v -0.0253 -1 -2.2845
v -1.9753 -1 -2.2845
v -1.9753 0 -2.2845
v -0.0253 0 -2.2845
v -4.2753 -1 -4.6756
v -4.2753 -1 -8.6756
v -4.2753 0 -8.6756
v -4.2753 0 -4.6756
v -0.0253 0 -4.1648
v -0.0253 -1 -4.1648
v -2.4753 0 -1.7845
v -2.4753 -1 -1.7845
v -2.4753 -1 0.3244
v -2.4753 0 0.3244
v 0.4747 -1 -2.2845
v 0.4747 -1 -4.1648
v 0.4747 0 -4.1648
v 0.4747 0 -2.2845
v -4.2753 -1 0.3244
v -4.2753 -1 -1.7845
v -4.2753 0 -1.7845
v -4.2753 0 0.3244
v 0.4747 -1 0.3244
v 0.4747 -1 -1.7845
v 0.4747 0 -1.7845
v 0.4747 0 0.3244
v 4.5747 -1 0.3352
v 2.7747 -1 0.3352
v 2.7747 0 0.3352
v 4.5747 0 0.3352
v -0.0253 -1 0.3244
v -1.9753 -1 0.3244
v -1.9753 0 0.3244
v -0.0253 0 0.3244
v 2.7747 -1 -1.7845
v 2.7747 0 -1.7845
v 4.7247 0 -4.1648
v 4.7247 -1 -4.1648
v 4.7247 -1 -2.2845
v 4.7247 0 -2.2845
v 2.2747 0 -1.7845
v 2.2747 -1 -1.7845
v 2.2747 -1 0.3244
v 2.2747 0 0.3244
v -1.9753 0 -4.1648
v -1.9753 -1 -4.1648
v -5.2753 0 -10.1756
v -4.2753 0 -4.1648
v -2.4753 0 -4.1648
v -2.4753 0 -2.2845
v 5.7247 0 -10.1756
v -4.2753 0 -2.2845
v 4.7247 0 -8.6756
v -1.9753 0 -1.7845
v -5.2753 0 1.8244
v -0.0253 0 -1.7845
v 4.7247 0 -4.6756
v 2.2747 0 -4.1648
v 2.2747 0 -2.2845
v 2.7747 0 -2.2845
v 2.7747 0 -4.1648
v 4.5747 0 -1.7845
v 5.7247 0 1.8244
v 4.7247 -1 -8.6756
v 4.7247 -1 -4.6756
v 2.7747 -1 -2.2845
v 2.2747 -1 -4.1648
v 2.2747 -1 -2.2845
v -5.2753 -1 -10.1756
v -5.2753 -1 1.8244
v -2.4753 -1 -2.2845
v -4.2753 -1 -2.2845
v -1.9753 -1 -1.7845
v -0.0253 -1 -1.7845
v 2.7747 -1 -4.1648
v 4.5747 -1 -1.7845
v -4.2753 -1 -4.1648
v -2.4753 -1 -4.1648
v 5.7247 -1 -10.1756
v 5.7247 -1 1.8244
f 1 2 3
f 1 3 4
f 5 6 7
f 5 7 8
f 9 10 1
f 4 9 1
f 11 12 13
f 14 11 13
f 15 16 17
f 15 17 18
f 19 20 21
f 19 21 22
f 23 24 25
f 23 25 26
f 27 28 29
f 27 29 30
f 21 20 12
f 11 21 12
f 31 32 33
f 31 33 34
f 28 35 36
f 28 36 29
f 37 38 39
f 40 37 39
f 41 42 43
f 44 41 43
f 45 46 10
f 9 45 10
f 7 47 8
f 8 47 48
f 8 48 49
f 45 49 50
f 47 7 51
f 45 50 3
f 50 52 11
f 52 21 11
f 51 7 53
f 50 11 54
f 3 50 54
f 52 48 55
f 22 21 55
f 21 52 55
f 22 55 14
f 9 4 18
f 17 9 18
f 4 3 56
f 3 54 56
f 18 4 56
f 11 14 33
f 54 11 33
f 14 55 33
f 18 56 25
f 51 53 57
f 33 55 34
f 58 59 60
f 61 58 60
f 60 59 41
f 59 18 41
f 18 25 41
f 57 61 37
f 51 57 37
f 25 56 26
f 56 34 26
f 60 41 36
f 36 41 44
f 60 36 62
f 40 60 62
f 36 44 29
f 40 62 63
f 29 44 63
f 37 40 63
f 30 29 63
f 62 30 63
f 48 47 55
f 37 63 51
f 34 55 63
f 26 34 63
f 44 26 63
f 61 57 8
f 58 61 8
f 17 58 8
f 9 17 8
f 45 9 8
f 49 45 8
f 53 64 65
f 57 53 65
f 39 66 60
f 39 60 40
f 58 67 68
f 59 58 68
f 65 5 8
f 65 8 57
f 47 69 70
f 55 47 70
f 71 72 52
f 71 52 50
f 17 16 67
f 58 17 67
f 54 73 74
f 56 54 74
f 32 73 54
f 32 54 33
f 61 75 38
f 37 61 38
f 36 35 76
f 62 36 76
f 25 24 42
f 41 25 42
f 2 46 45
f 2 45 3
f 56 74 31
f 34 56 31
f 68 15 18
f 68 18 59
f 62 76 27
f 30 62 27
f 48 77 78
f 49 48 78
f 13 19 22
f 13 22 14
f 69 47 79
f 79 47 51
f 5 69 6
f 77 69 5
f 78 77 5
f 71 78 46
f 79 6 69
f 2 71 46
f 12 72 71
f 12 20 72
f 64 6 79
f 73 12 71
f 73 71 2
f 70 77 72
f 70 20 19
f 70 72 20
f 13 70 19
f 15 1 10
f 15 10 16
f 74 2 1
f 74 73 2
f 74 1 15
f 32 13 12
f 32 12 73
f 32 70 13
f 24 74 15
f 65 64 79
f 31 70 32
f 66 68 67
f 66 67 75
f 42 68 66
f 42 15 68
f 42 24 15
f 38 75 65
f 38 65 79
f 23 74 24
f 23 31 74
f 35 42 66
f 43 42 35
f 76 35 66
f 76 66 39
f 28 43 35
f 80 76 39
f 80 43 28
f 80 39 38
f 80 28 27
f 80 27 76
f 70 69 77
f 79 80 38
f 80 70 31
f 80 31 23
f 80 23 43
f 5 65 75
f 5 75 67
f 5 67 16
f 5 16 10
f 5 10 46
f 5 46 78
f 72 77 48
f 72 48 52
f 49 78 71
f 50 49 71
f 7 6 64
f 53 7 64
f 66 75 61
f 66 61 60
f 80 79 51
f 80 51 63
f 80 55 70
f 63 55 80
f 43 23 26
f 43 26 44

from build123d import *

# Parameters (mm, degrees)
SKETCH_W        = 23
SKETCH_H        = 12
PAD_DEPTH       = 1
SKETCH001_W     = 4
SKETCH001_H     = 4
SKETCH001_W_2   = 9
SKETCH001_W_3   = 1.8
SKETCH001_H_2   = 2.119738
SKETCH001_W_4   = 1.7
SKETCH001_H_3   = 1.880262
SKETCH001_H_4   = 2.108956
SKETCH001_W_5   = 1.95
SKETCH001_H_5   = 1.880263
SKETCH001_H_6   = 2.119737
POCKET_DEPTH    = 5
SKETCH002_W     = 6
SKETCH002_H     = 12
POCKET001_DEPTH = 5


with BuildPart() as part:
    # Sketch → Pad (new body)
    with BuildSketch(Plane.XZ):
        with Locations((0.224666, -4.175566)):
            Rectangle(SKETCH_W, SKETCH_H)
    extrude(amount=PAD_DEPTH)

    # Sketch001 (on Face6 of Pad) → Pocket (cut)
    with BuildSketch(Plane.XZ.offset(1)):
        with Locations((-7.275334, -6.675566)):
            Rectangle(SKETCH001_W, SKETCH001_H)
        with Locations((7.724666, -6.675566)):
            Rectangle(SKETCH001_W, SKETCH001_H)
        with Locations((0.224666, -6.675566)):
            Rectangle(SKETCH001_W_2, SKETCH001_H)
        with Locations((-8.375334, -0.735435)):
            Rectangle(SKETCH001_W_3, SKETCH001_H_2)
        with Locations((-6.125334, -0.735435)):
            Rectangle(SKETCH001_W_4, SKETCH001_H_2)
        with Locations((-8.375334, -3.235435)):
            Rectangle(SKETCH001_W_3, SKETCH001_H_3)
        with Locations((-6.125334, -3.235435)):
            Rectangle(SKETCH001_W_4, SKETCH001_H_3)
        with Locations((-3.375334, -0.730044)):
            Rectangle(SKETCH001_W_3, SKETCH001_H_4)
        with Locations((-1.000334, -0.730044)):
            Rectangle(SKETCH001_W_5, SKETCH001_H_4)
        with Locations((-3.375334, -3.224654)):
            Rectangle(SKETCH001_W_3, SKETCH001_H_5)
        with Locations((-1.000334, -3.224654)):
            Rectangle(SKETCH001_W_5, SKETCH001_H_5)
        with Locations((1.374666, -0.730044)):
            Rectangle(SKETCH001_W_3, SKETCH001_H_4)
        with Locations((3.674666, -0.724653)):
            Rectangle(SKETCH001_W_3, SKETCH001_H_6)
        with Locations((1.374666, -3.224654)):
            Rectangle(SKETCH001_W_3, SKETCH001_H_5)
        with Locations((3.749666, -3.224654)):
            Rectangle(SKETCH001_W_5, SKETCH001_H_5)
        with Locations((6.624666, -0.732224)):
            Rectangle(SKETCH001_W_3, SKETCH001_H_2)
        with Locations((8.874666, -0.732224)):
            Rectangle(SKETCH001_W_4, SKETCH001_H_2)
        with Locations((6.624666, -3.232224)):
            Rectangle(SKETCH001_W_3, SKETCH001_H_3)
        with Locations((8.874666, -3.232224)):
            Rectangle(SKETCH001_W_4, SKETCH001_H_3)
    extrude(amount=-POCKET_DEPTH, mode=Mode.SUBTRACT)

    # Sketch002 (on Face5 of Pocket) → Pocket001 (cut)
    with BuildSketch(Plane.XZ.offset(1)):
        with Locations((-8.275334, -4.175566)):
            Rectangle(SKETCH002_W, SKETCH002_H)
        with Locations((8.724666, -4.175566)):
            Rectangle(SKETCH002_W, SKETCH002_H)
    extrude(amount=-POCKET001_DEPTH, mode=Mode.SUBTRACT)


solid = part.part
